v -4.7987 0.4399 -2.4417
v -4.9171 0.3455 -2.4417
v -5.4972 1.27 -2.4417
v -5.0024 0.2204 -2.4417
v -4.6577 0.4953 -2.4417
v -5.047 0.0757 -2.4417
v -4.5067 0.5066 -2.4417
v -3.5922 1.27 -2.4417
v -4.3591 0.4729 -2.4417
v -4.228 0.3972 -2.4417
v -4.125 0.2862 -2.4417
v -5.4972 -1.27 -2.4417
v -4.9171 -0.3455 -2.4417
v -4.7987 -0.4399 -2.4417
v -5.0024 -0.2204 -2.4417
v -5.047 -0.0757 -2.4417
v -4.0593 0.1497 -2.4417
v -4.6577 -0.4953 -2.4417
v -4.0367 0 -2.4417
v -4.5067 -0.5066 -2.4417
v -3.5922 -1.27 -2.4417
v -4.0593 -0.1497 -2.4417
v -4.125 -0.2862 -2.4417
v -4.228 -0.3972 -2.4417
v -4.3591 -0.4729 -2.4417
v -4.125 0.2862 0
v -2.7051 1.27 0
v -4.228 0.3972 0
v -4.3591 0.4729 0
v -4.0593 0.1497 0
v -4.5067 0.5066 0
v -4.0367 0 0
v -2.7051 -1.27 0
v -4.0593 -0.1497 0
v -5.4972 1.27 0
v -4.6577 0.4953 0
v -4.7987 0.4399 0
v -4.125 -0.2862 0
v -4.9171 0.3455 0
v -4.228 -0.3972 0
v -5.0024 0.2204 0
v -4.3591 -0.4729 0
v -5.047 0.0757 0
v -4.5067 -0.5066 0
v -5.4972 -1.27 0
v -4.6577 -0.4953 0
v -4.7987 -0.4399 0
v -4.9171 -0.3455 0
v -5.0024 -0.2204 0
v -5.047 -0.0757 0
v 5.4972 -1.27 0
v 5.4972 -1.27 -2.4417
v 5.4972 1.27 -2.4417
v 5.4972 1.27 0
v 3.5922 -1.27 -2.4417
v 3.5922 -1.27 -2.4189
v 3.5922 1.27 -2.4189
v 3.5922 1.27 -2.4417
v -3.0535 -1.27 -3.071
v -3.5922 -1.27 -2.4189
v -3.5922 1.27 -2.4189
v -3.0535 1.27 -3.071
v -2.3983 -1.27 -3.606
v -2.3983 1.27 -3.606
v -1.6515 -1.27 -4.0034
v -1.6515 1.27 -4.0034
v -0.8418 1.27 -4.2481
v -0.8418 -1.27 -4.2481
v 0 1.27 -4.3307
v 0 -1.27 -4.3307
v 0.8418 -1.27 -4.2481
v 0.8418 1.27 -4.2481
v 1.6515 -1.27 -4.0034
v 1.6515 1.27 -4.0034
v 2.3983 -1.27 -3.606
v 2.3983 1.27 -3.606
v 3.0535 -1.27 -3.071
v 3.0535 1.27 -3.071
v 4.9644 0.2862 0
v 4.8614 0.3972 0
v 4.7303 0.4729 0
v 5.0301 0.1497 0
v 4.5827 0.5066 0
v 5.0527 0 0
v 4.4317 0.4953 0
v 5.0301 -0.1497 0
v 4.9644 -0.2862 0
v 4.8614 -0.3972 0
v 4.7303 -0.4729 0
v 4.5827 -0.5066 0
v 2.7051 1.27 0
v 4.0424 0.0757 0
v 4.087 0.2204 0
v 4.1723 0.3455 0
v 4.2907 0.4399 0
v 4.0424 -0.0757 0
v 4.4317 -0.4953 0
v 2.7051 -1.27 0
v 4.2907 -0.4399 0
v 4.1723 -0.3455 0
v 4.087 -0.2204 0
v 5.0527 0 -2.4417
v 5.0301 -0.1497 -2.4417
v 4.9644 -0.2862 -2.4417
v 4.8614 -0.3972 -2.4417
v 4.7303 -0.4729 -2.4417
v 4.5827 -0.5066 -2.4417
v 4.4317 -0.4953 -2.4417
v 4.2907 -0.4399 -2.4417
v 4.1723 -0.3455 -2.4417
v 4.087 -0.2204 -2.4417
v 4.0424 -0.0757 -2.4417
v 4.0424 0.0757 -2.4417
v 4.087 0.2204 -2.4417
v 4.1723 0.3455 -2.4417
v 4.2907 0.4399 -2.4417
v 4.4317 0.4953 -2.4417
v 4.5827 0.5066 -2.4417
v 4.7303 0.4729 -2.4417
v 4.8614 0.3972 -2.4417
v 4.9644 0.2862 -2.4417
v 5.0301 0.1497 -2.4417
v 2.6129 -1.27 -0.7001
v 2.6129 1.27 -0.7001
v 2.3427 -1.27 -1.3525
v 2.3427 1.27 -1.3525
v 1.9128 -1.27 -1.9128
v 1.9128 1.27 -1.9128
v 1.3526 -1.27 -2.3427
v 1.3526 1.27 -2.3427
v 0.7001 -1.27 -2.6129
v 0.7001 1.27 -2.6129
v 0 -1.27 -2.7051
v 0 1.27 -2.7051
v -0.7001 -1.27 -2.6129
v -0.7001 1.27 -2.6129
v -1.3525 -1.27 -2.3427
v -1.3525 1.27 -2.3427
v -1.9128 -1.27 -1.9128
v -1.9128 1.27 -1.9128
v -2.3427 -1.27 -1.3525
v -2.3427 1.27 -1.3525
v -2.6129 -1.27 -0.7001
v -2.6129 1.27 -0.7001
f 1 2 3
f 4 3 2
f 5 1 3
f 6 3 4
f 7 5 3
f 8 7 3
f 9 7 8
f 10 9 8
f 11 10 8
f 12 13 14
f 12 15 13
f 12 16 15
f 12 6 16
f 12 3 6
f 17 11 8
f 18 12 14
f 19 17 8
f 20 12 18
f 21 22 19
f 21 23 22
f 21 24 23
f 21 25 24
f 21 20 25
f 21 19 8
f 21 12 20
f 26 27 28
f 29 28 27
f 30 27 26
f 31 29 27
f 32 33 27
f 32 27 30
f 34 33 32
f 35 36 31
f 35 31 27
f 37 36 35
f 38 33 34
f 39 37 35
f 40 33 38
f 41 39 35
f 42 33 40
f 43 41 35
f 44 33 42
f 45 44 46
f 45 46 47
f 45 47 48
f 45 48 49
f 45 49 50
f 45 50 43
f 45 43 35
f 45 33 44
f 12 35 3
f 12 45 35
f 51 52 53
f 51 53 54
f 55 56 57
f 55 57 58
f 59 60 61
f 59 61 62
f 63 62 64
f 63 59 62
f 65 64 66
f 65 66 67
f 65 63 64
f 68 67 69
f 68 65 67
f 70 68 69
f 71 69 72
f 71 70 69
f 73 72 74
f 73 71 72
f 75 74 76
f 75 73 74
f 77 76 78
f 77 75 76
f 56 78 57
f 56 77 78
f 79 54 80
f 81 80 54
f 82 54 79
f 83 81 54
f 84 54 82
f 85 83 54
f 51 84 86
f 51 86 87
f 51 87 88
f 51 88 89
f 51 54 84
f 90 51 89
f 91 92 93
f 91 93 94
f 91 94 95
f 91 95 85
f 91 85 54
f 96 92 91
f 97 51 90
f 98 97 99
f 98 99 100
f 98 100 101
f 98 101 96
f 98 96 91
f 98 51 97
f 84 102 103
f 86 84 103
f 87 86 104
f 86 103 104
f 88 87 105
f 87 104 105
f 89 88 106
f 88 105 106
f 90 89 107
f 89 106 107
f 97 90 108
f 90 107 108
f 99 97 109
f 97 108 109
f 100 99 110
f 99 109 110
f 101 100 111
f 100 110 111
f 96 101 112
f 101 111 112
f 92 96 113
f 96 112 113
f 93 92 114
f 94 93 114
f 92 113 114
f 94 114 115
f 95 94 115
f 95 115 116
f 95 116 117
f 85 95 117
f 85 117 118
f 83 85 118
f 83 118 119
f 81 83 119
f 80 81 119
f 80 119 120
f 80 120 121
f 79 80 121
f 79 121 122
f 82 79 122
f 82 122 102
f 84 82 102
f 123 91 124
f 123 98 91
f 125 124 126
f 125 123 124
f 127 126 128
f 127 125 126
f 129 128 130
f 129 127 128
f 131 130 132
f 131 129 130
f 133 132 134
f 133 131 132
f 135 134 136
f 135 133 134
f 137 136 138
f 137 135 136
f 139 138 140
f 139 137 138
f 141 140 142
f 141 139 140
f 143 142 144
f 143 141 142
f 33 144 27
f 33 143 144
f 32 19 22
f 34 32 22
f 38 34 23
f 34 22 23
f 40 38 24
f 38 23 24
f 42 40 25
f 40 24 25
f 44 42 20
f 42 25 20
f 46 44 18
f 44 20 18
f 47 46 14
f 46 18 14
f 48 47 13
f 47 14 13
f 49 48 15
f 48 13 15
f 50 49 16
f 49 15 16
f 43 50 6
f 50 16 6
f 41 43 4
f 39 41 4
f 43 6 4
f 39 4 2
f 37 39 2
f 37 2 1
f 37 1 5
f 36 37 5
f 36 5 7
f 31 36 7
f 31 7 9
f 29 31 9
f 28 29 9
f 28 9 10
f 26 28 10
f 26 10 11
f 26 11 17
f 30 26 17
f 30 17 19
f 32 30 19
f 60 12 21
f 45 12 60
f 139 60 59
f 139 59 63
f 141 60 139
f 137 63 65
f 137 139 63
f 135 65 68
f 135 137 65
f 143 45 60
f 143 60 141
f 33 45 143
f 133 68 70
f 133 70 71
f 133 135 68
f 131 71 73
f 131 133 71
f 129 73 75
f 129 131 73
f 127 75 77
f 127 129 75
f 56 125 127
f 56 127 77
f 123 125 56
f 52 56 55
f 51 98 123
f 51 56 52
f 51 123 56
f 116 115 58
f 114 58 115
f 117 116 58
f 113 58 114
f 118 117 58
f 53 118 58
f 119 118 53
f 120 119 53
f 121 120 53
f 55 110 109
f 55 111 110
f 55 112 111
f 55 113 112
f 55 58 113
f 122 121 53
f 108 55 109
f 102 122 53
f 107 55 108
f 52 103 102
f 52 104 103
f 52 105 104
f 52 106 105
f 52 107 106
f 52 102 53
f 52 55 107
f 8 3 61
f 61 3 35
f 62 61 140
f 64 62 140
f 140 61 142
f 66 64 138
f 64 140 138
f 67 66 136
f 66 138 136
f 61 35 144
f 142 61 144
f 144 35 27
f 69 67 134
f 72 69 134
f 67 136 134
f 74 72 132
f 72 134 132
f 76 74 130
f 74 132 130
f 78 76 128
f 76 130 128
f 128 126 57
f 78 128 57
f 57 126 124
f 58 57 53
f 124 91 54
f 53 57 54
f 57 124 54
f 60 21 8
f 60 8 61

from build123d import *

# Parameters (mm, degrees)
F1_DEPTH = 1.27
F3_R     = 0.508
F2_R     = 0.508
F4_DEPTH = 25.4


with BuildPart() as f1:
    # F0 (on Front) → F1 (new body, symmetric)
    with BuildSketch(Plane.XZ):
        with BuildLine():
            ThreePointArc((-3.592195, -2.4189042089), (-4.1419609714, -1.2645638781), (-4.3307, 0))
            Line((-4.3307, 0), (-5.497195, 0))
            Line((-5.497195, 0), (-5.497195, -2.441702))
            Line((-5.497195, -2.441702), (-3.592195, -2.441702))
            Line((-3.592195, -2.441702), (-3.592195, -2.4189042089))
        make_face()
        with BuildLine():
            Line((5.497195, 0), (4.3307, 0))
            ThreePointArc((4.3307, 0), (4.1419609714, -1.2645638781), (3.592195, -2.4189042089))
            Line((3.592195, -2.4189042089), (3.592195, -2.441702))
            Line((3.592195, -2.441702), (5.497195, -2.441702))
            Line((5.497195, -2.441702), (5.497195, 0))
        make_face()
        with BuildLine():
            Line((-3.592195, 0), (-4.3307, 0))
            ThreePointArc((-4.3307, 0), (-4.1419609714, -1.2645638781), (-3.592195, -2.4189042089))
            Line((-3.592195, -2.4189042089), (-3.592195, 0))
        make_face()
        with BuildLine():
            ThreePointArc((3.592195, -2.4189042089), (4.1419609714, -1.2645638781), (4.3307, 0))
            Line((4.3307, 0), (3.592195, 0))
            Line((3.592195, 0), (3.592195, -2.4189042089))
        make_face()
        with BuildLine():
            ThreePointArc((-3.592195, -2.4189042089), (0, -4.3307), (3.592195, -2.4189042089))
            Line((3.592195, -2.4189042089), (3.592195, 0))
            Line((3.592195, 0), (2.7051, 0))
            ThreePointArc((2.7051, 0), (0, -2.7051), (-2.7051, 0))
            Line((-2.7051, 0), (-3.592195, 0))
            Line((-3.592195, 0), (-3.592195, -2.4189042089))
        make_face()
    extrude(amount=F1_DEPTH, both=True)

    # F3 (on face) + F2 (on face) → F4 (cut)
    with BuildSketch(Plane(origin=(0, 0, -2.441702), x_dir=(1, 0, 0), z_dir=(0, 0, -1))):
        with Locations((4.544695, 0)):
            Circle(F3_R)
    with BuildSketch(Plane(origin=(0, 0, -2.441702), x_dir=(1, 0, 0), z_dir=(0, 0, -1))):
        with Locations((-4.544695, 0)):
            Circle(F2_R)
    extrude(amount=-F4_DEPTH, mode=Mode.SUBTRACT)


solid = f1.part
